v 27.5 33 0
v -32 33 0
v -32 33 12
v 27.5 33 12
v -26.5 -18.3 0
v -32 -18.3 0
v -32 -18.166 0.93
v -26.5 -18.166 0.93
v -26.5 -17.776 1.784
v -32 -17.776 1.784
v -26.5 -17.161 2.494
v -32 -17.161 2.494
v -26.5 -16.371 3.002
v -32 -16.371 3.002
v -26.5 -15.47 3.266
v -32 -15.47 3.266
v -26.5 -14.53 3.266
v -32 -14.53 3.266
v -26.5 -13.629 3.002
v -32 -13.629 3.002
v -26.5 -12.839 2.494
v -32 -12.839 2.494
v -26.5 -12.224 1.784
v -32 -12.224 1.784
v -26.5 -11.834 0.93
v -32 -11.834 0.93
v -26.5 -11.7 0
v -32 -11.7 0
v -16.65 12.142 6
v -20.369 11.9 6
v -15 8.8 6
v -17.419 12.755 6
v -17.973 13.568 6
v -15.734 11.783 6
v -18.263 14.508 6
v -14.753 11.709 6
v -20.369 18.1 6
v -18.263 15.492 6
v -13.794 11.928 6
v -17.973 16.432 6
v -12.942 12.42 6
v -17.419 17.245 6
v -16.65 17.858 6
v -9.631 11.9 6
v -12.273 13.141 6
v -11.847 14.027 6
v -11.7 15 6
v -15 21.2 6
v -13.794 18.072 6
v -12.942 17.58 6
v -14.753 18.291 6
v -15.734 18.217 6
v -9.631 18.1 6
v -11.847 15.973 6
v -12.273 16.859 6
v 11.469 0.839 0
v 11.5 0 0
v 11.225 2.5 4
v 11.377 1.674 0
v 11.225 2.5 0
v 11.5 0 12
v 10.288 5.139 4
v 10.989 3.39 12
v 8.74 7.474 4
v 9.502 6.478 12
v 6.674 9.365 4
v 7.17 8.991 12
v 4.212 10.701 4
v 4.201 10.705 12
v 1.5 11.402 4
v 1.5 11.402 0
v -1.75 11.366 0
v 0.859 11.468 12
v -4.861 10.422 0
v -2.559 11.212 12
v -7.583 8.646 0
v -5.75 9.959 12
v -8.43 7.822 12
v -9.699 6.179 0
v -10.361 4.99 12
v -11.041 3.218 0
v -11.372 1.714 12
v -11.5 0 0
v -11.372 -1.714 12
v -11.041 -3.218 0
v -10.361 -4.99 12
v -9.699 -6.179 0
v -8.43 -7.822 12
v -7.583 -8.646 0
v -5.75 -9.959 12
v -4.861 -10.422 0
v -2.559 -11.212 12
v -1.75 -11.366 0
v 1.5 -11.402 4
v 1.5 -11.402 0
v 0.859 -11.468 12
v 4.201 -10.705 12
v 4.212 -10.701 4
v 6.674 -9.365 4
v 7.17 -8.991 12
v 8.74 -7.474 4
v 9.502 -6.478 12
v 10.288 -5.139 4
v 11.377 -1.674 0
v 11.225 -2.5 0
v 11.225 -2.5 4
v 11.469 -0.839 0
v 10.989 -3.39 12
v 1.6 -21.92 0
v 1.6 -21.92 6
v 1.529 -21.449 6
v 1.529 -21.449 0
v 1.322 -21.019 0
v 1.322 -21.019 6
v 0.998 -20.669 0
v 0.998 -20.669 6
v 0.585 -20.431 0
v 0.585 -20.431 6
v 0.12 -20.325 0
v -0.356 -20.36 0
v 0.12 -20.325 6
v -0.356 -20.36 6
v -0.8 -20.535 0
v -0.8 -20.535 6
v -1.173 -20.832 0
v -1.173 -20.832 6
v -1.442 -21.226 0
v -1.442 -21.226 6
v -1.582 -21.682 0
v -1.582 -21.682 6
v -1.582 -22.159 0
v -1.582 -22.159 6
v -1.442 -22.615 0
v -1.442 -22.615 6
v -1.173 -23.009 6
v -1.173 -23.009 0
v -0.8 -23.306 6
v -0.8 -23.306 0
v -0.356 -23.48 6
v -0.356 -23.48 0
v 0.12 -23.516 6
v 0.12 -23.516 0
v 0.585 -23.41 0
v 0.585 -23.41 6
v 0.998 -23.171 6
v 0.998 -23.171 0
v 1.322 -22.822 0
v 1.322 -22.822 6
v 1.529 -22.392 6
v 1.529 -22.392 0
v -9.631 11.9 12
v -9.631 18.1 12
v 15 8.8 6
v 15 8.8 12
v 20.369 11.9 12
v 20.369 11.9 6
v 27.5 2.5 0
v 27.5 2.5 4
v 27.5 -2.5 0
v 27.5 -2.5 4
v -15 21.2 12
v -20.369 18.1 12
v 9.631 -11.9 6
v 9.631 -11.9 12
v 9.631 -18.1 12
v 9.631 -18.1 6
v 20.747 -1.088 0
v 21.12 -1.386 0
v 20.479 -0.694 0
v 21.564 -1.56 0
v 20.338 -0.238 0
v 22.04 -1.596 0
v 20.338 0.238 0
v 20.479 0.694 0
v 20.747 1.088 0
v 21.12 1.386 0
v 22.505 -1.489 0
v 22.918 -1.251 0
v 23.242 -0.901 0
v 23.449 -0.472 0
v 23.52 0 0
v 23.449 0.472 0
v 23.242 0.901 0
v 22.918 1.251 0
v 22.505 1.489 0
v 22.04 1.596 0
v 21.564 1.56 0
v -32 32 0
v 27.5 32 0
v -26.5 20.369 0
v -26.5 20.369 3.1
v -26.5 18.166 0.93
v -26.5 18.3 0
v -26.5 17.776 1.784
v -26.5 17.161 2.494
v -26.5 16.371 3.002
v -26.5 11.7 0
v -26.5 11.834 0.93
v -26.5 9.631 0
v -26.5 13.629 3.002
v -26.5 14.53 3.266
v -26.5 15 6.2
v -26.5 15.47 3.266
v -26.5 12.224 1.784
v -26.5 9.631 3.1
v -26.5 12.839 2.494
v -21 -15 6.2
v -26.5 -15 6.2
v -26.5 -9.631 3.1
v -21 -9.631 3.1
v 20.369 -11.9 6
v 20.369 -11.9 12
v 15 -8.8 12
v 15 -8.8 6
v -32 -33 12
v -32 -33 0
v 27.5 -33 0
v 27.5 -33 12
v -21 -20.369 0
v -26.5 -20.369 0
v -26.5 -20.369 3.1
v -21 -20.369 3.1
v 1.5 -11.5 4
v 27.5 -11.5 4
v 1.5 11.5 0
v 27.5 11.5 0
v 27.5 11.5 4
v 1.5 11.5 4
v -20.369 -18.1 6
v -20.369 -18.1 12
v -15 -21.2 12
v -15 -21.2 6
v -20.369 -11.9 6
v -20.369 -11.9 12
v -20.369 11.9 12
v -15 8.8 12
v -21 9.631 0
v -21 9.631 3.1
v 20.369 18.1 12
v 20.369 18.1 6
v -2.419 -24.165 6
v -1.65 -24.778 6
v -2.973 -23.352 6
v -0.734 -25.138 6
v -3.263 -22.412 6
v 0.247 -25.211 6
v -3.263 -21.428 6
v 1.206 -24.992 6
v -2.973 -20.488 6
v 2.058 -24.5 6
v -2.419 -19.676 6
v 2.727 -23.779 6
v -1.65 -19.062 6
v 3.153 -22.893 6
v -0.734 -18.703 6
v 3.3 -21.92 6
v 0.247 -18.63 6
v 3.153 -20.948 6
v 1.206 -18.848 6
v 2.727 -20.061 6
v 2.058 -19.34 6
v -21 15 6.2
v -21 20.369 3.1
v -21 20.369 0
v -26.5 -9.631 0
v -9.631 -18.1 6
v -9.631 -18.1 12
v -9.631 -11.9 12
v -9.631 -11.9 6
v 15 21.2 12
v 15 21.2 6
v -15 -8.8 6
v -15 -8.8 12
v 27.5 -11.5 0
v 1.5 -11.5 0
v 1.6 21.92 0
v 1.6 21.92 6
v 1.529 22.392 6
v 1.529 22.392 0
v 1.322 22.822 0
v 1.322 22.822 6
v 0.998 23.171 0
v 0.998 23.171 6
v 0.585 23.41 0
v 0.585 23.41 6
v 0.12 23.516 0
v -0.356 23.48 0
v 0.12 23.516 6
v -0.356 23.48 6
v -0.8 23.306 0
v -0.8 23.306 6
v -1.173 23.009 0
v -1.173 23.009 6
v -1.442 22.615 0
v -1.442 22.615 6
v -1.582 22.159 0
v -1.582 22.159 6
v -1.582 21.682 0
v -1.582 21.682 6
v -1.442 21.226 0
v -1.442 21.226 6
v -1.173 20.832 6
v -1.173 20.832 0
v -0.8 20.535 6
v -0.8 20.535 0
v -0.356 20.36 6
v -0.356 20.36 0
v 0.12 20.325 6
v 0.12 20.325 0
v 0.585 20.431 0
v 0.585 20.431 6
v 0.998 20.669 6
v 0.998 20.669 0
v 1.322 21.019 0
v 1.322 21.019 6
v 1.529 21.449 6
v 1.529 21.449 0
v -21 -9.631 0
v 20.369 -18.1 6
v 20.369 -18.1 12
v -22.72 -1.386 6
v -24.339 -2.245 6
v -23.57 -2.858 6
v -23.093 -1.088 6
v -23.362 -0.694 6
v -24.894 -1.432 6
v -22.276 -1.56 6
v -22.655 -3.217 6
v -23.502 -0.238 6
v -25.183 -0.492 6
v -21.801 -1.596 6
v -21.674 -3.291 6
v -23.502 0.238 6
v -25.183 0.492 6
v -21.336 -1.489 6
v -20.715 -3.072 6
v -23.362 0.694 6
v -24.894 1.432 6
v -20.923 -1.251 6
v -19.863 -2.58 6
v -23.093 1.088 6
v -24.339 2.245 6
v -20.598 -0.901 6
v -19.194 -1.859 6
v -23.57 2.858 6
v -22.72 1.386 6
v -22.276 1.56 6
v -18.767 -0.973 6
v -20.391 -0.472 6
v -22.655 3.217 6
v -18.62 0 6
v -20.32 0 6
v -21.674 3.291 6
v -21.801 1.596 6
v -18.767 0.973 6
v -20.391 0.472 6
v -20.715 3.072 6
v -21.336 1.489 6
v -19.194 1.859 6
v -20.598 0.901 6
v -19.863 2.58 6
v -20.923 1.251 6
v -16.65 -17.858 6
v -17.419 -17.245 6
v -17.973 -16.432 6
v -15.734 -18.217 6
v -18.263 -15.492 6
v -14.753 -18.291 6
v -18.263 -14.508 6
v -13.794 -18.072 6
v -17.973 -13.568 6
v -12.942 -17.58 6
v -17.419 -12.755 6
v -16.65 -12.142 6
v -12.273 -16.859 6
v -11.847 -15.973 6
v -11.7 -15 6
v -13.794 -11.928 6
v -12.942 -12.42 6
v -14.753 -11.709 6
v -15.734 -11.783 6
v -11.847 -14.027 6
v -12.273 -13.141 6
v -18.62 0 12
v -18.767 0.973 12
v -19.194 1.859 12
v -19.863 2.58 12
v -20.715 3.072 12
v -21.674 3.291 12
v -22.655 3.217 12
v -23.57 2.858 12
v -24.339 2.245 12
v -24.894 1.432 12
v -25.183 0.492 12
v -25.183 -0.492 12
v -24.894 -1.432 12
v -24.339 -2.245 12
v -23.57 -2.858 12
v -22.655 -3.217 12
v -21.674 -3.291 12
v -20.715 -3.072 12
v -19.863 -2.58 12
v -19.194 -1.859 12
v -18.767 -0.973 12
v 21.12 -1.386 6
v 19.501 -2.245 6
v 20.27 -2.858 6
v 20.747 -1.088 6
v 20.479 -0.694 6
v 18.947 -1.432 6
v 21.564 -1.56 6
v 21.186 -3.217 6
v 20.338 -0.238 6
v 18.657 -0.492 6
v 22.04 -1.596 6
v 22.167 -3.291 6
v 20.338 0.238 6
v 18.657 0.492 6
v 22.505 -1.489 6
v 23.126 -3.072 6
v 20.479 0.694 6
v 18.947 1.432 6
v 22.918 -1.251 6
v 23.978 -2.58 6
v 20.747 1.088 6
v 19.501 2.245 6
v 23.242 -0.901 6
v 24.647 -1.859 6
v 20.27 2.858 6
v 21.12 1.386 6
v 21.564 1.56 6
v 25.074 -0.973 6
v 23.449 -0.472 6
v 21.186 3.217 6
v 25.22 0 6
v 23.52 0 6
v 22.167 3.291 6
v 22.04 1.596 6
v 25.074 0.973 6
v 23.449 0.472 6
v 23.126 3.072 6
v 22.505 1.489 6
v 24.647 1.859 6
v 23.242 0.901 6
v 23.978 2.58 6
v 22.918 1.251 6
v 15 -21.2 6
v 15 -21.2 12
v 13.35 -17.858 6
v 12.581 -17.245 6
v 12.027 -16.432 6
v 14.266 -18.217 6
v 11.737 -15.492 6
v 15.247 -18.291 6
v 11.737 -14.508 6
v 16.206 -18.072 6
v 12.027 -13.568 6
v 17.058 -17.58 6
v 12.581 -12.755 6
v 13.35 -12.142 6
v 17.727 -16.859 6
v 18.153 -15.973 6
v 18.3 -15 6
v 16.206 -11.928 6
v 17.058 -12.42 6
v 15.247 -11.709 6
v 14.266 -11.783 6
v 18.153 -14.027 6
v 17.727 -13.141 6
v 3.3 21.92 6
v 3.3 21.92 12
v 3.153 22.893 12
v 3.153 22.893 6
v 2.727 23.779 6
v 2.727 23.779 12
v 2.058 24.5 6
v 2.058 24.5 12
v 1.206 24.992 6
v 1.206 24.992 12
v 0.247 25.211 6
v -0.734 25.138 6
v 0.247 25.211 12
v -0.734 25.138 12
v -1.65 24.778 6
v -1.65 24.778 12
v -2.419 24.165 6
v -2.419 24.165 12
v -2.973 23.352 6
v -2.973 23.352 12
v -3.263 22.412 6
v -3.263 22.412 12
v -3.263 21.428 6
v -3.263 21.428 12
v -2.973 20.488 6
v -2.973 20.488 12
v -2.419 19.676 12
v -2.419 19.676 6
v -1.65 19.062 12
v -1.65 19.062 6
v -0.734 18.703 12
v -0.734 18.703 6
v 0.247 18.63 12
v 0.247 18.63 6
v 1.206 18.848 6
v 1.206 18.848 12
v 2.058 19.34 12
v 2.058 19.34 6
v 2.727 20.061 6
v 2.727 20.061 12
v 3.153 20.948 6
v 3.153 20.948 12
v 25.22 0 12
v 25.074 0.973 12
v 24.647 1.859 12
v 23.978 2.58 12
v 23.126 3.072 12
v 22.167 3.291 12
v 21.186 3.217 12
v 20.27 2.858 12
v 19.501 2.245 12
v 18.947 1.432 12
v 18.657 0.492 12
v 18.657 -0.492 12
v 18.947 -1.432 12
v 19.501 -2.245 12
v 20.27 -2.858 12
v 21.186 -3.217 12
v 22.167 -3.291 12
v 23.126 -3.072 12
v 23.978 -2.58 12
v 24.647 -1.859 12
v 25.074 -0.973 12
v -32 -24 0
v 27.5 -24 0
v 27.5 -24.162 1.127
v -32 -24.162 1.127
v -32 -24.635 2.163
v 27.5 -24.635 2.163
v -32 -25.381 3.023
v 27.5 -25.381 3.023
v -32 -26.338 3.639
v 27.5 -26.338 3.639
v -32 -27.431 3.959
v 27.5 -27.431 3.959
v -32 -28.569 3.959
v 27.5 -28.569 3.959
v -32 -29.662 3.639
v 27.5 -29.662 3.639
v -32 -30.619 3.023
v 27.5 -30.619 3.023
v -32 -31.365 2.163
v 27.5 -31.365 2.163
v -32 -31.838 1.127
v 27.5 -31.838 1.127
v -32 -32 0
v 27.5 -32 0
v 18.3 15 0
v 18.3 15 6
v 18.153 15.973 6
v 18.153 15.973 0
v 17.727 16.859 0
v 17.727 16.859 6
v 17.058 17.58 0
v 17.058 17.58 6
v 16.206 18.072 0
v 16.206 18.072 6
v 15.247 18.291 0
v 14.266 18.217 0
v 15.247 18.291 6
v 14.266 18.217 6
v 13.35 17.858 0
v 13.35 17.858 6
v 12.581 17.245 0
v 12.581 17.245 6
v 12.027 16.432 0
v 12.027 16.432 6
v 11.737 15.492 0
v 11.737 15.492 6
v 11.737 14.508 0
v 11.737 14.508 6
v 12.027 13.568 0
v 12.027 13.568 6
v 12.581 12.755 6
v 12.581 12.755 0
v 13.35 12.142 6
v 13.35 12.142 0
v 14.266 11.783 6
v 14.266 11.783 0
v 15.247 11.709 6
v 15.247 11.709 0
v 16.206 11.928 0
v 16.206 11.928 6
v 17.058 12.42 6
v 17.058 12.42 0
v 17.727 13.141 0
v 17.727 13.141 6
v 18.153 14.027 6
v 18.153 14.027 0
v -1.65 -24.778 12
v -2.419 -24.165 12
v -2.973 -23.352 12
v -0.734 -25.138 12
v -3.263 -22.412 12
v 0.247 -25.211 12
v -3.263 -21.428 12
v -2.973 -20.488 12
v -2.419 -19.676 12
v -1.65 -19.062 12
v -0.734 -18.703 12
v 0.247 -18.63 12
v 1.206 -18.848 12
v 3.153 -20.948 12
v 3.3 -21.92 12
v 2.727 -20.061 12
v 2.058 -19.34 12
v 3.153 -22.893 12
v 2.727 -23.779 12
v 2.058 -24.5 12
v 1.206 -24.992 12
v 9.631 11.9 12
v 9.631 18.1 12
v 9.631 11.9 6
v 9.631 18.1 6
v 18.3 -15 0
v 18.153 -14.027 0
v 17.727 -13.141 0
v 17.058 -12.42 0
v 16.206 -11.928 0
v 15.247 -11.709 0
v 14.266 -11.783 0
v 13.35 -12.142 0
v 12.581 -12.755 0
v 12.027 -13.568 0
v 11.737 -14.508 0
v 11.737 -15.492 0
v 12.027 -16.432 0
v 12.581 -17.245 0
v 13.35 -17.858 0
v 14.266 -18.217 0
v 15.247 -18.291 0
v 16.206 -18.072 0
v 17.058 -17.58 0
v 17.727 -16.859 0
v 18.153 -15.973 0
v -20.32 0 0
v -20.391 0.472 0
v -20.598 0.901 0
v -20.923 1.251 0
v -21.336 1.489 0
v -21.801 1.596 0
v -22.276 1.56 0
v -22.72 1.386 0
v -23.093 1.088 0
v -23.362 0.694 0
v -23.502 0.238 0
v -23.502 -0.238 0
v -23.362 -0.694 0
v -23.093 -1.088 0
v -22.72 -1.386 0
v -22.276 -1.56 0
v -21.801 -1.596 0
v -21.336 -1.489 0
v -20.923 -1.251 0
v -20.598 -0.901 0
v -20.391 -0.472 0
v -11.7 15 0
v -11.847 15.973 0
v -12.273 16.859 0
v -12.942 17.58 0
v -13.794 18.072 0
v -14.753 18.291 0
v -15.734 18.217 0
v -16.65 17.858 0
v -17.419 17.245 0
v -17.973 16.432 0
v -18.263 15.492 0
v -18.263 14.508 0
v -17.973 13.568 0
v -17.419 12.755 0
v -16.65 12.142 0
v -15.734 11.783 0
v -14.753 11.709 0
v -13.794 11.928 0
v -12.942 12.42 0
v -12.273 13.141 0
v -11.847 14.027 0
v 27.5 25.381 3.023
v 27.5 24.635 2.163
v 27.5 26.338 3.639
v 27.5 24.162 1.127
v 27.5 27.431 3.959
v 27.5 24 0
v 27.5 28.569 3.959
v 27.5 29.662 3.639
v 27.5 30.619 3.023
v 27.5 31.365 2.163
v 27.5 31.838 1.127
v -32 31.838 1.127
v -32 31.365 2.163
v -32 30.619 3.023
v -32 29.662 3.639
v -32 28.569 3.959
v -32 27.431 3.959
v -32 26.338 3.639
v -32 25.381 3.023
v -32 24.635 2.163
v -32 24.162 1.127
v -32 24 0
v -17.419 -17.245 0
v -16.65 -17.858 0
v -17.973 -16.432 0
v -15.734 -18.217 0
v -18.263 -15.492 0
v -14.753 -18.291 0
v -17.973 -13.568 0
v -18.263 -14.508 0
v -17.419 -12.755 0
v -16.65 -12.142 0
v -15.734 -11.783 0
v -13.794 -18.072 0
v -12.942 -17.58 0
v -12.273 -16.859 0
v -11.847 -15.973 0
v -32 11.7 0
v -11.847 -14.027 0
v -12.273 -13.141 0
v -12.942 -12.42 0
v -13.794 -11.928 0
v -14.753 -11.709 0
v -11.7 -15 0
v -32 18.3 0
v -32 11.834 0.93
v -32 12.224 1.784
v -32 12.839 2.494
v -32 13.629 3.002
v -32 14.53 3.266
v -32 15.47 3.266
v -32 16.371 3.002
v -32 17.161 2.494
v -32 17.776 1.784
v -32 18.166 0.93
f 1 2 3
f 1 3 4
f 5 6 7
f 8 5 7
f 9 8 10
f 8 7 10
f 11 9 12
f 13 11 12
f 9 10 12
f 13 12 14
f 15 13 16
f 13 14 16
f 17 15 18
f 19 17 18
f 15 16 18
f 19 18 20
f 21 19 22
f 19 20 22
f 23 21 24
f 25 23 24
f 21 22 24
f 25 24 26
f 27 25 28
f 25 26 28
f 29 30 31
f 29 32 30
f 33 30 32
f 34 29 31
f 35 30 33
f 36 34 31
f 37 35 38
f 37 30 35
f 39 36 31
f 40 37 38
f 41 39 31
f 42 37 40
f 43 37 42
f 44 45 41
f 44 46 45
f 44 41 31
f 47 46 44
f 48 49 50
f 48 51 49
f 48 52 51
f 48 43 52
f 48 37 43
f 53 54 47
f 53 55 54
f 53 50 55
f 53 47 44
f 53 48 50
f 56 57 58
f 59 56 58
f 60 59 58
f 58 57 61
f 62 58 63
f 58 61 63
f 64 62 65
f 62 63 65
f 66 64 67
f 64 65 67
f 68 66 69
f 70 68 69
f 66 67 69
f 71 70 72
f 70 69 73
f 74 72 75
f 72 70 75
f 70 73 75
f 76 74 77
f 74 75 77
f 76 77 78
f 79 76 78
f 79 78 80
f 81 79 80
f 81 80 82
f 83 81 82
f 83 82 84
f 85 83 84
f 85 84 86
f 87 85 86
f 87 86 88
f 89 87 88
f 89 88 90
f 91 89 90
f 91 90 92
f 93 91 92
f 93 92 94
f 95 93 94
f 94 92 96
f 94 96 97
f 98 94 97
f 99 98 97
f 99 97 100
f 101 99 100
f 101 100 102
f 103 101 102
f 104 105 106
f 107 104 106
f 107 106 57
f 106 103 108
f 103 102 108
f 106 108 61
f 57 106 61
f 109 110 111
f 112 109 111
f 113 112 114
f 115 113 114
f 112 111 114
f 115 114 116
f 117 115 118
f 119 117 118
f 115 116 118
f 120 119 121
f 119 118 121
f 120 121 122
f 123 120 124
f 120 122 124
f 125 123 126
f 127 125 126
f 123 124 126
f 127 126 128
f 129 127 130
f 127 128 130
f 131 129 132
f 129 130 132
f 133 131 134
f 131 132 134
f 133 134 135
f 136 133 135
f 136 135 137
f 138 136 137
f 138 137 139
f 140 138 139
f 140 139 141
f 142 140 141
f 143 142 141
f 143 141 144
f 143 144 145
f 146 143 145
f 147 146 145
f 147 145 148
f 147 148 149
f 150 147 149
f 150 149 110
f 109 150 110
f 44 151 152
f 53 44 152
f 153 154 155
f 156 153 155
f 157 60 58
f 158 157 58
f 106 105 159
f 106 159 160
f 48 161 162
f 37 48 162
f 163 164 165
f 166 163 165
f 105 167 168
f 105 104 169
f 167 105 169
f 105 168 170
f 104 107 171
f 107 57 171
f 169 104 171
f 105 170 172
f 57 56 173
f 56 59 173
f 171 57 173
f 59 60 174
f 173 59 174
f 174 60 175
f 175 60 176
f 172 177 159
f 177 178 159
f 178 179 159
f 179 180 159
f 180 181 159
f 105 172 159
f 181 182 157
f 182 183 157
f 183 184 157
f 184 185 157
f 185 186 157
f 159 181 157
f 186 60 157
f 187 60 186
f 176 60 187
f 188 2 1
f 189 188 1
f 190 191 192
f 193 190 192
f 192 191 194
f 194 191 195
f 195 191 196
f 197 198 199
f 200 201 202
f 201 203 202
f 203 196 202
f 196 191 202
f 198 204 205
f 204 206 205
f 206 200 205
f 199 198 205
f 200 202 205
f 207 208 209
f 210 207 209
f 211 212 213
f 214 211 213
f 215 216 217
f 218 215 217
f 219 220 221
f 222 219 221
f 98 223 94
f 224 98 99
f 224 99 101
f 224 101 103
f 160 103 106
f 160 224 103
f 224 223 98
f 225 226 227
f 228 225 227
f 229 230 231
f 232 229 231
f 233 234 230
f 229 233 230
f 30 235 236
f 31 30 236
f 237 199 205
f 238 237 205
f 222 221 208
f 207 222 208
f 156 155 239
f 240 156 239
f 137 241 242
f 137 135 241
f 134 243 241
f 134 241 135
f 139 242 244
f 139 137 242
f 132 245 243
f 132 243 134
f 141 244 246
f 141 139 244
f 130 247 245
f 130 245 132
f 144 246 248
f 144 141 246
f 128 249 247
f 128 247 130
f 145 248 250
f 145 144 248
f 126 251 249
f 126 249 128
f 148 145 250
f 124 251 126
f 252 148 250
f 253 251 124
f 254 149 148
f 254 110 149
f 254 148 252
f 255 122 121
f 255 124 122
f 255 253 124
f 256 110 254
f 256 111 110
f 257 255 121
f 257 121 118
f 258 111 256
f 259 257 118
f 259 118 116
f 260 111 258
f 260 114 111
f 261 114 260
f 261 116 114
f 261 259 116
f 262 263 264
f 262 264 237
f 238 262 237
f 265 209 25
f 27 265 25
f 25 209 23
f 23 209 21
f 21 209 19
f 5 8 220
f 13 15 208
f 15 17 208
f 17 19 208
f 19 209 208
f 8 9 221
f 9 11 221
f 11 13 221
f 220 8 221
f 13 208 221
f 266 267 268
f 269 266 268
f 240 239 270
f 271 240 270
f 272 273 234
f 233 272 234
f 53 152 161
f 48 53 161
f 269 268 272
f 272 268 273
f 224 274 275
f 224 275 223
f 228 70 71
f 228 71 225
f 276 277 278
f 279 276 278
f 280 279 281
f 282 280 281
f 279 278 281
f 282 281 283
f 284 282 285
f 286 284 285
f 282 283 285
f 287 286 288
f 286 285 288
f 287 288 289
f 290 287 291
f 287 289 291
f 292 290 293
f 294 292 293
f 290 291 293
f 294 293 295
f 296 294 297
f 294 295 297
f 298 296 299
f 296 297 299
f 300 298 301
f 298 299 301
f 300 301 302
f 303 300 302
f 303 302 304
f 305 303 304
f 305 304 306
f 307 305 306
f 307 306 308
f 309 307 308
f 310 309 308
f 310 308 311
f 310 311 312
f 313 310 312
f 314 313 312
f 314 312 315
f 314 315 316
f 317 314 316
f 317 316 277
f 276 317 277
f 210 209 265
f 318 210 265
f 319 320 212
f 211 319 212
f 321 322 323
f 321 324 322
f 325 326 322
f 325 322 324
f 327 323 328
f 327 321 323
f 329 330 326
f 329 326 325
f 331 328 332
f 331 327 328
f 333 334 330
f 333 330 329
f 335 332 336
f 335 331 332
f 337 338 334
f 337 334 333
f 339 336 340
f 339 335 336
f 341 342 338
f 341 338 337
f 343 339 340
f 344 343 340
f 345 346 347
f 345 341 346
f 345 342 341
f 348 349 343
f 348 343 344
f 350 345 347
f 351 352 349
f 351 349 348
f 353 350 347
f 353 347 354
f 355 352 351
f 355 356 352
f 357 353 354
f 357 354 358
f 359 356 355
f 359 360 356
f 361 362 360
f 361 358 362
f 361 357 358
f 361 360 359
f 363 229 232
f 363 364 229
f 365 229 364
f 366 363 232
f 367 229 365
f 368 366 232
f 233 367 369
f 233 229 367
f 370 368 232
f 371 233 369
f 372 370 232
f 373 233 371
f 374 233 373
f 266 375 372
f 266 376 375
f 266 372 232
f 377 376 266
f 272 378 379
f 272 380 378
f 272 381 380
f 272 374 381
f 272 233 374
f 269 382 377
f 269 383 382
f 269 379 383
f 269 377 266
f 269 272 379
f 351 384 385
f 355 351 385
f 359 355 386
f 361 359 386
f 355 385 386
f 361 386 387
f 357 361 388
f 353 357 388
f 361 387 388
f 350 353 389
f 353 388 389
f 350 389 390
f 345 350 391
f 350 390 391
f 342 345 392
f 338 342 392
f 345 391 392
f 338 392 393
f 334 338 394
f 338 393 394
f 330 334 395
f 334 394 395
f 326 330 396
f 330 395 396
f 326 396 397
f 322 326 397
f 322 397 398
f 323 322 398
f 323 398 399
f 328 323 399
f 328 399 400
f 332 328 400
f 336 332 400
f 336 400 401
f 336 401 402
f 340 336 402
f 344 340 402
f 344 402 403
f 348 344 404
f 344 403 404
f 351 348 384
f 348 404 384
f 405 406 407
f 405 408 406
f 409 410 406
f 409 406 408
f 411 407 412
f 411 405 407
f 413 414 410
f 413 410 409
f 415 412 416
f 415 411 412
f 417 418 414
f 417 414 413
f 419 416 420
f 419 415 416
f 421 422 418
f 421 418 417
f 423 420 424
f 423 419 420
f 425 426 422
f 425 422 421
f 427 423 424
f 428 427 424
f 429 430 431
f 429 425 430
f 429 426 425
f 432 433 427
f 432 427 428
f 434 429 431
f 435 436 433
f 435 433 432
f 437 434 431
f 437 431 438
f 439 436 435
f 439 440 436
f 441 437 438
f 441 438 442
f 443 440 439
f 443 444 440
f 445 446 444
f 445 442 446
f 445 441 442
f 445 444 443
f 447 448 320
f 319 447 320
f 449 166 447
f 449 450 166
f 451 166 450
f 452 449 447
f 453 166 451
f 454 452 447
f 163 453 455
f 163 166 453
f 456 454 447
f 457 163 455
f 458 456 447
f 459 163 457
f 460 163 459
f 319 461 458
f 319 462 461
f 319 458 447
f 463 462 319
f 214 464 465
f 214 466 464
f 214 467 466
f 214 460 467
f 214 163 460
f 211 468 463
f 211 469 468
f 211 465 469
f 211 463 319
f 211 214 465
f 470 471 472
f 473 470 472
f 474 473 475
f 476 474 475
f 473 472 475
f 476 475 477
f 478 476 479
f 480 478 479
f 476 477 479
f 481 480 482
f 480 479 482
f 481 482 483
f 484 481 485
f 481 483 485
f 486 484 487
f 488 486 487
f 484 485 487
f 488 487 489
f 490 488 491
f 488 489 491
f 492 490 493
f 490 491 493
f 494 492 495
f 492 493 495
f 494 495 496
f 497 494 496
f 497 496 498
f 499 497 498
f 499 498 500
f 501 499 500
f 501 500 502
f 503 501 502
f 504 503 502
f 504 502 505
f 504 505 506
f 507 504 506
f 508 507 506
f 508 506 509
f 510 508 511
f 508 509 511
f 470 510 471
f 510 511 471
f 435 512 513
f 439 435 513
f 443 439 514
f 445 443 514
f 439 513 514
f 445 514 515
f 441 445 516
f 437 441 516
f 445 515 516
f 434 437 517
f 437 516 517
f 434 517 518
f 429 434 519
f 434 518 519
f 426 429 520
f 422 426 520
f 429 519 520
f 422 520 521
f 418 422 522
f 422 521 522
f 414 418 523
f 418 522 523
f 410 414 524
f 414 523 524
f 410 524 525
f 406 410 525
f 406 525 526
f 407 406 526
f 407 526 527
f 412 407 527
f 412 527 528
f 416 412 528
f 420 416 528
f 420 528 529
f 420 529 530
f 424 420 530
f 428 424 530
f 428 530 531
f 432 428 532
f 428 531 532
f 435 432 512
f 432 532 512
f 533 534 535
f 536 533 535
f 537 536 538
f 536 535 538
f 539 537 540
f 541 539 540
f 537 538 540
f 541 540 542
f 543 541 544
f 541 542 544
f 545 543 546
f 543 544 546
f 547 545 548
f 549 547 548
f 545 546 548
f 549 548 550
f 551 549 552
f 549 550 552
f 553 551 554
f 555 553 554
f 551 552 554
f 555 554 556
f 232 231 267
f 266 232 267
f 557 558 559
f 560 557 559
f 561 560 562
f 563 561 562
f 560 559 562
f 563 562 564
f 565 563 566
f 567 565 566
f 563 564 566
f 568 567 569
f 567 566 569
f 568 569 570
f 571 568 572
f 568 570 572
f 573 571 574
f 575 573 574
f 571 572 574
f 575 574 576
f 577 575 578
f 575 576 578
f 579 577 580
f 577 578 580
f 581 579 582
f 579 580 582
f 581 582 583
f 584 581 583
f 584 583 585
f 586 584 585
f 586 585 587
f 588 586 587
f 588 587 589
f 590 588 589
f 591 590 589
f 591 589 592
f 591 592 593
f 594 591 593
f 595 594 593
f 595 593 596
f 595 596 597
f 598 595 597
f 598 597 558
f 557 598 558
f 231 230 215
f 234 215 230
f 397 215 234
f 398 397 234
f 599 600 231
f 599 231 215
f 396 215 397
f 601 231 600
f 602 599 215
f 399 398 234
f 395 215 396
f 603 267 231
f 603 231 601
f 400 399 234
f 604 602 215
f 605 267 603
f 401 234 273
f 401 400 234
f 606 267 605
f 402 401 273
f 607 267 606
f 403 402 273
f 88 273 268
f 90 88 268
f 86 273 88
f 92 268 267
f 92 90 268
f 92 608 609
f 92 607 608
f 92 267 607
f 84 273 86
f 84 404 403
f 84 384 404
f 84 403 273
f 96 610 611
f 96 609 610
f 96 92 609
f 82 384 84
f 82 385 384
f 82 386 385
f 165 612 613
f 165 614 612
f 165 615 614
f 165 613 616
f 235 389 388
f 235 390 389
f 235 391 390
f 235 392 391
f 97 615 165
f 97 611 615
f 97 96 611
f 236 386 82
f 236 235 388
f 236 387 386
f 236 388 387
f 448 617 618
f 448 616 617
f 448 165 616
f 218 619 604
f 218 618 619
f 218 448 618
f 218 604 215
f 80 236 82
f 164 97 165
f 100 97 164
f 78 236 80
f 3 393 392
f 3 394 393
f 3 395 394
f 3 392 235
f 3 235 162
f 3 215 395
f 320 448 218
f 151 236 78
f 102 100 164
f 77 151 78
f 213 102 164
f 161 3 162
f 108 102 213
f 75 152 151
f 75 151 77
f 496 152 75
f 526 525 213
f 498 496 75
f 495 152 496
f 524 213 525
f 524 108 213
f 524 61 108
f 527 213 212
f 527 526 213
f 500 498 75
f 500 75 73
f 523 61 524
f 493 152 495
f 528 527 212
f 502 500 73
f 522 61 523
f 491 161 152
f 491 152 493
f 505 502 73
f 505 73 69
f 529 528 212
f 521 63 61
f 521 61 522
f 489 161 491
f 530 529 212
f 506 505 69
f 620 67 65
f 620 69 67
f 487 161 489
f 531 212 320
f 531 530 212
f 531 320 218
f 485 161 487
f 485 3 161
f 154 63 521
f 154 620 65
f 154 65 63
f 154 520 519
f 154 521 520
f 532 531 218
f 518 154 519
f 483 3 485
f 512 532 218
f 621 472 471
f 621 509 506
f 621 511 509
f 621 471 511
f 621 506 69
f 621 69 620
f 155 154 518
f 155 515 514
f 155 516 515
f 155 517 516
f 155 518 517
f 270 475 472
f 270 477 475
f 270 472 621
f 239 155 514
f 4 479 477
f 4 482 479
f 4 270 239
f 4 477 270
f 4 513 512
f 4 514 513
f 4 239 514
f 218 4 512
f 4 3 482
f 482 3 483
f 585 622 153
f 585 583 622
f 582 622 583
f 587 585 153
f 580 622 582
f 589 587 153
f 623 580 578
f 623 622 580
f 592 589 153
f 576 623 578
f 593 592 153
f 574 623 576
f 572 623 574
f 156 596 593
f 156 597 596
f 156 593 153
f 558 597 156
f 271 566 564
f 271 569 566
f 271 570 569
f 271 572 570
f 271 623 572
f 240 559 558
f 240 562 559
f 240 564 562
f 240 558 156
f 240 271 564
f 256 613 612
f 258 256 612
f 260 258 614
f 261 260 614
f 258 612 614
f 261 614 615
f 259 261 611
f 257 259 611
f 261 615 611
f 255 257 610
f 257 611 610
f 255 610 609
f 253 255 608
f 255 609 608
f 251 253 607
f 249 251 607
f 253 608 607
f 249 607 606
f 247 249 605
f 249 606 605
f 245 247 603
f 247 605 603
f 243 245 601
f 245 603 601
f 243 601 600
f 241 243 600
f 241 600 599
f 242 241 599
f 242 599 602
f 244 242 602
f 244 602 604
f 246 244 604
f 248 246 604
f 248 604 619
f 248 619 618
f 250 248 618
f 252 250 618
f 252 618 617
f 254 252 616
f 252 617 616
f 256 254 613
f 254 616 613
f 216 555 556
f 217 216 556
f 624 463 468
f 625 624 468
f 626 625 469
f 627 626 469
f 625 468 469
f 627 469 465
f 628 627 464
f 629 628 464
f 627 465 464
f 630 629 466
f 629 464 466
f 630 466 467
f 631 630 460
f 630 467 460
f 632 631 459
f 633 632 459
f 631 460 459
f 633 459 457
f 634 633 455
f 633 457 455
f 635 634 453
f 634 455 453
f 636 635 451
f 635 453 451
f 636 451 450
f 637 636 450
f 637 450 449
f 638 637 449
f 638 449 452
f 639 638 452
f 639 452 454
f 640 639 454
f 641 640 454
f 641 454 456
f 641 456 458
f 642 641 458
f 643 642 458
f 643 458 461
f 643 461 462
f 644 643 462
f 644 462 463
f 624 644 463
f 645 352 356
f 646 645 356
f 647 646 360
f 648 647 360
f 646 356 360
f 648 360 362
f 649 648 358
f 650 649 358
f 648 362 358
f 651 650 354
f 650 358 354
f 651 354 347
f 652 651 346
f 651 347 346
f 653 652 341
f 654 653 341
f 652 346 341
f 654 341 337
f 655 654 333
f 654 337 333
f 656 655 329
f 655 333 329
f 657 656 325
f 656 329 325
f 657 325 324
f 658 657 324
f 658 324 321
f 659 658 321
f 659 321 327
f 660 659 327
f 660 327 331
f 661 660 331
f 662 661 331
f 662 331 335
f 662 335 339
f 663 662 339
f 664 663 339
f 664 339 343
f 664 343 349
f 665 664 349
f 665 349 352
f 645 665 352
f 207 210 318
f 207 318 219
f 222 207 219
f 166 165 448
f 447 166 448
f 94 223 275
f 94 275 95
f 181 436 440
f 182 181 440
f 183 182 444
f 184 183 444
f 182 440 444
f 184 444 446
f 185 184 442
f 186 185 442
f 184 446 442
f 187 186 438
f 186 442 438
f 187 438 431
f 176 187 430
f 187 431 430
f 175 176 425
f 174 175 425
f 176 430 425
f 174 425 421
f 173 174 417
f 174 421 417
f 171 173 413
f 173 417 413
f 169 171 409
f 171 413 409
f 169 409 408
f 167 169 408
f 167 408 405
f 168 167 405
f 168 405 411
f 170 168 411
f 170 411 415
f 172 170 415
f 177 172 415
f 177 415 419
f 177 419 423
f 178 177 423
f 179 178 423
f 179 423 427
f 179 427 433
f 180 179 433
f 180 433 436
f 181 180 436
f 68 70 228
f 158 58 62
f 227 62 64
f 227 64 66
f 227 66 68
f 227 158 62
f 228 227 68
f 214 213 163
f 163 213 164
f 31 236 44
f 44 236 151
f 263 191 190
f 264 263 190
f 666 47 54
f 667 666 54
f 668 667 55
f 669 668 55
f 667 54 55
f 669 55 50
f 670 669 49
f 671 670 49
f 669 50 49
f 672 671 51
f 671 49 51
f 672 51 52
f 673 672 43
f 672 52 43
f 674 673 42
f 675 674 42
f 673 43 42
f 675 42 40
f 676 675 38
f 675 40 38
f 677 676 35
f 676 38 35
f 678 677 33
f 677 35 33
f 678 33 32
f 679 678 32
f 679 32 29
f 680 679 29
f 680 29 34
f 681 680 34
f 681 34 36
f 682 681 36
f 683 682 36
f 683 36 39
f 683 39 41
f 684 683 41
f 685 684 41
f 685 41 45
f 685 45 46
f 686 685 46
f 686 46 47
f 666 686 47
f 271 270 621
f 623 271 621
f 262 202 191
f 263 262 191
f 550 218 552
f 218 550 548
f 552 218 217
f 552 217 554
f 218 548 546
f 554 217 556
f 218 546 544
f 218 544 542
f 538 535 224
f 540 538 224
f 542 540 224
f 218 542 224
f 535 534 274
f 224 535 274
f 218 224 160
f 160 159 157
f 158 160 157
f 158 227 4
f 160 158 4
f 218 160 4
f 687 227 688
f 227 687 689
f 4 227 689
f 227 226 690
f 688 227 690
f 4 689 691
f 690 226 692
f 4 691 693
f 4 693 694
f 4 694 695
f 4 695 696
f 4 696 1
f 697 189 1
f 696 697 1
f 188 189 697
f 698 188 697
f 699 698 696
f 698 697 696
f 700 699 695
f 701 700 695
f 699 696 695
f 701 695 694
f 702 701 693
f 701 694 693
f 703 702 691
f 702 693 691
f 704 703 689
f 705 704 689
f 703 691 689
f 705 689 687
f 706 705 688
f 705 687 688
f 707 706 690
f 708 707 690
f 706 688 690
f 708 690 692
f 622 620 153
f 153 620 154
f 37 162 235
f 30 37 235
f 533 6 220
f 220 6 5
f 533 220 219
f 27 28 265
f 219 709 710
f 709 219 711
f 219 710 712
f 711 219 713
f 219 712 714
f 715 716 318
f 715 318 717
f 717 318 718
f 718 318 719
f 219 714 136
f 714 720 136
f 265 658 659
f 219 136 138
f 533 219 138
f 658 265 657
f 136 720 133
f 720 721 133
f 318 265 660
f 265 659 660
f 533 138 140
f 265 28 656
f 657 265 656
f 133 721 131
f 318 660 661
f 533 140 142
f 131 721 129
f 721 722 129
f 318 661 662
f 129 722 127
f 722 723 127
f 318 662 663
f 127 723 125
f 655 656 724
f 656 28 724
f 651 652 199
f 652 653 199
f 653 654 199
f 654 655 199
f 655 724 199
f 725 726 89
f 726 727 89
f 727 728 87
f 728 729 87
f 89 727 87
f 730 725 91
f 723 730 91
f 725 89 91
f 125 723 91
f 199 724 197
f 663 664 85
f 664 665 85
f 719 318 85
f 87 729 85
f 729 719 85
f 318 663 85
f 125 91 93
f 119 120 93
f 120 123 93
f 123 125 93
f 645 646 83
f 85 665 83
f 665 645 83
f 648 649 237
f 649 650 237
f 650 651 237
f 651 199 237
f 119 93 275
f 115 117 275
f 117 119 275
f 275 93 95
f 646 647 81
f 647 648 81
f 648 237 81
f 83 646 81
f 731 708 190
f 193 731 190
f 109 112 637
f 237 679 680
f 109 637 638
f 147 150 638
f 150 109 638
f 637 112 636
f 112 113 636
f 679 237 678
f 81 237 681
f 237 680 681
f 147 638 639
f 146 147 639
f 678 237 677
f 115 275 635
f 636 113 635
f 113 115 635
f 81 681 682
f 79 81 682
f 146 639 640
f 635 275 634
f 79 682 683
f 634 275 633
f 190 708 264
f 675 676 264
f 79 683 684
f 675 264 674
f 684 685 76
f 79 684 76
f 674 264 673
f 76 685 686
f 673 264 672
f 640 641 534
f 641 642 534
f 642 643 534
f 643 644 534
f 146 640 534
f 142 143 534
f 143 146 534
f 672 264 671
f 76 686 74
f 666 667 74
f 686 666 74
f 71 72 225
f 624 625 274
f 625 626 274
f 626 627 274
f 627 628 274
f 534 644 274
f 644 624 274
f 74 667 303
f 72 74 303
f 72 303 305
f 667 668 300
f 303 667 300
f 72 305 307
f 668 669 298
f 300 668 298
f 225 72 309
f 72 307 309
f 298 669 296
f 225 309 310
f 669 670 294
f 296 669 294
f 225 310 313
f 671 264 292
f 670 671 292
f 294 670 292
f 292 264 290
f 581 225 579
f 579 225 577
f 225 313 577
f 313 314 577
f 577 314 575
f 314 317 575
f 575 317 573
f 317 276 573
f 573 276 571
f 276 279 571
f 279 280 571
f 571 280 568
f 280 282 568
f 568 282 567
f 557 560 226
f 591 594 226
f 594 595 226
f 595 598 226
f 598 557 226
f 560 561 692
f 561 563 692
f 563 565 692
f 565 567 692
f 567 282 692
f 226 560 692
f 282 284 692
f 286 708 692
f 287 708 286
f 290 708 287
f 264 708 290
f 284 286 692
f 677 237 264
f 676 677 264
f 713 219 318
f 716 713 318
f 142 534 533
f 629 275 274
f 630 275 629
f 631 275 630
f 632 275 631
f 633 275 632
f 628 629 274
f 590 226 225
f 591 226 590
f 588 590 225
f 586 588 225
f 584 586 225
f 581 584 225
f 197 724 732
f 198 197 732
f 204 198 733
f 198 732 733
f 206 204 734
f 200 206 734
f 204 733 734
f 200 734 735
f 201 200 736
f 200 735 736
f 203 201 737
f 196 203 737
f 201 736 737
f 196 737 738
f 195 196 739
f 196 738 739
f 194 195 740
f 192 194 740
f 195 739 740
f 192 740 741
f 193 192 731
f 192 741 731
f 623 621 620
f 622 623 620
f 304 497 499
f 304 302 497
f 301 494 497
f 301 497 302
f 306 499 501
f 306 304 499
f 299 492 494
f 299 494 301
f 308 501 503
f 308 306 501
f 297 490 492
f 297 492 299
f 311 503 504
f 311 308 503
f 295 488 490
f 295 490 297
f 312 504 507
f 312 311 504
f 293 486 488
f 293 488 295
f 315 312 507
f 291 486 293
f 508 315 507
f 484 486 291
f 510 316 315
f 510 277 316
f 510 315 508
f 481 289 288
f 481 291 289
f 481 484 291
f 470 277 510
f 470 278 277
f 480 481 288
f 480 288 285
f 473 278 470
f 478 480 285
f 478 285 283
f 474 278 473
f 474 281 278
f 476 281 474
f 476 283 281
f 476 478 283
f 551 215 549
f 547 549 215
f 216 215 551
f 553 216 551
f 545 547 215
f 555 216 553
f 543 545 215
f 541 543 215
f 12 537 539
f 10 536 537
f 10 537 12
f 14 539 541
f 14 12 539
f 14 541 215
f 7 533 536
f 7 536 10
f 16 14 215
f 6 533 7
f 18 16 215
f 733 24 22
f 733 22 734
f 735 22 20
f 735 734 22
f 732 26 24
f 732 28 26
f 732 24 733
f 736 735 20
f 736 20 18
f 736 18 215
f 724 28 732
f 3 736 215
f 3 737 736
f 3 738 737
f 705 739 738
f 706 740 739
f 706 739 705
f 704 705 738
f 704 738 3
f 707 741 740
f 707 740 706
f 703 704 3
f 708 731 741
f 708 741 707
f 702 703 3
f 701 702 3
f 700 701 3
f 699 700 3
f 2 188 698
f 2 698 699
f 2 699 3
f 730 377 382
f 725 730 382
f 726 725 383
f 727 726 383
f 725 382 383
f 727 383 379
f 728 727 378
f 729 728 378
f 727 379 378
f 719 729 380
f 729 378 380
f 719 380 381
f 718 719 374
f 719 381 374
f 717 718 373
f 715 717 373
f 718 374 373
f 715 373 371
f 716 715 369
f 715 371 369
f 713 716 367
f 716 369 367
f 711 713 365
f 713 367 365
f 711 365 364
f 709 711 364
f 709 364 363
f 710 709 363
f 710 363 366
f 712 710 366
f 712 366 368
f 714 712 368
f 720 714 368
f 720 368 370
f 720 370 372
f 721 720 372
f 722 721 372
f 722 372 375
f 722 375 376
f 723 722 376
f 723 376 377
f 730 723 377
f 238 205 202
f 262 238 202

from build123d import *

# Parameters (mm, degrees)
SKETCH_W        = 59.5
SKETCH_H        = 66
PAD_DEPTH       = 12
SKETCH001_R     = 3.3
POCKET_DEPTH    = 6
SKETCH002_R     = 3.3
SKETCH002_R_2   = 1.6
POCKET001_DEPTH = 6.001
SKETCH003_R     = 4
POCKET002_DEPTH = 59.501
SKETCH004_R     = 3.3
POCKET003_DEPTH = 5.5
POCKET004_DEPTH = 5.5
SKETCH006_R     = 11.5
POCKET005_DEPTH = 12.001
SKETCH007_W     = 9
SKETCH007_H     = 4
POCKET006_DEPTH = 26


with BuildPart() as part:
    # Sketch → Pad (new body)
    with BuildSketch(Plane.XY):
        with Locations((-2.25, 0)):
            Rectangle(SKETCH_W, SKETCH_H)
    extrude(amount=PAD_DEPTH)

    # Sketch001 (on Face6 of Pad) → Pocket (cut)
    with BuildSketch(Plane.XY.offset(12)):
        with Locations((0, 21.92031)):
            Circle(SKETCH001_R)
        with Locations((-21.92031, 0)):
            Circle(SKETCH001_R)
        with Locations((21.92031, 0)):
            Circle(SKETCH001_R)
        with Locations((0, -21.92031)):
            Circle(SKETCH001_R)
        Polygon((-9.630642, 18.1), (-15, 21.2), (-20.369358, 18.1), (-20.369358, 11.9), (-15, 8.8), (-9.630642, 11.9), align=None)
        Polygon((20.369358, 18.1), (15, 21.2), (9.630642, 18.1), (9.630642, 11.9), (15, 8.8), (20.369358, 11.9), align=None)
        Polygon((-20.369358, -18.1), (-15, -21.2), (-9.630642, -18.1), (-9.630642, -11.9), (-15, -8.8), (-20.369358, -11.9), align=None)
        Polygon((20.369358, -11.9), (15, -8.8), (9.630642, -11.9), (9.630642, -18.1), (15, -21.2), (20.369358, -18.1), align=None)
    extrude(amount=-POCKET_DEPTH, mode=Mode.SUBTRACT)

    # Sketch002 (on Face41 of Pocket) → Pocket001 (cut, through all)
    with BuildSketch(Plane.XY.offset(6)):
        with Locations((-15, 15)):
            Circle(SKETCH002_R)
        with Locations((0, 21.92031)):
            Circle(SKETCH002_R_2)
        with Locations((15, 15)):
            Circle(SKETCH002_R)
        with Locations((-15, -15)):
            Circle(SKETCH002_R)
        with Locations((15, -15)):
            Circle(SKETCH002_R)
        with Locations((0, -21.92031)):
            Circle(SKETCH002_R_2)
        with Locations((21.92031, 0)):
            Circle(SKETCH002_R_2)
        with Locations((-21.92031, 0)):
            Circle(SKETCH002_R_2)
    extrude(amount=-POCKET001_DEPTH, mode=Mode.SUBTRACT)

    # Sketch003 (on Face3 of Pocket001) → Pocket002 (cut, through all)
    with BuildSketch(Plane.YZ.offset(27.5)):
        with Locations((-28, 0)):
            Circle(SKETCH003_R)
        with Locations((28, 0)):
            Circle(SKETCH003_R)
    extrude(amount=-POCKET002_DEPTH, mode=Mode.SUBTRACT)

    # Sketch004 (on Face2 of Pocket002) → Pocket003 (cut)
    with BuildSketch(Plane(origin=(-32, 0, 0), x_dir=(0, -1, 0), z_dir=(-1, 0, 0))):
        with Locations((-15, 0)):
            Circle(SKETCH004_R)
        with Locations((15, 0)):
            Circle(SKETCH004_R)
    extrude(amount=-POCKET003_DEPTH, mode=Mode.SUBTRACT)

    # Sketch005 (on Face42 of Pocket003) → Pocket004 (cut)
    with BuildSketch(Plane(origin=(-26.5, 0, 0), x_dir=(0, -1, 0), z_dir=(-1, 0, 0))):
        Polygon((-9.630642, 3.1), (-15, 6.2), (-20.369358, 3.1), (-20.369358, -3.1), (-15, -6.2), (-9.630642, -3.1), align=None)
        Polygon((9.630642, -3.1), (15, -6.2), (20.369358, -3.1), (20.369358, 3.1), (15, 6.2), (9.630642, 3.1), align=None)
    extrude(amount=-POCKET004_DEPTH, mode=Mode.SUBTRACT)

    # Sketch006 (on Face5 of Pocket004) → Pocket005 (cut, through all)
    with BuildSketch(Plane.XY.offset(12)):
        Circle(SKETCH006_R)
    extrude(amount=-POCKET005_DEPTH, mode=Mode.SUBTRACT)

    # Sketch007 (on Face3 of Pocket005) → Pocket006 (cut)
    with BuildSketch(Plane.YZ.offset(27.5)):
        with Locations((-7, 2)):
            Rectangle(SKETCH007_W, SKETCH007_H)
        with Locations((7, 2)):
            Rectangle(SKETCH007_W, SKETCH007_H)
    extrude(amount=-POCKET006_DEPTH, mode=Mode.SUBTRACT)


solid = part.part
